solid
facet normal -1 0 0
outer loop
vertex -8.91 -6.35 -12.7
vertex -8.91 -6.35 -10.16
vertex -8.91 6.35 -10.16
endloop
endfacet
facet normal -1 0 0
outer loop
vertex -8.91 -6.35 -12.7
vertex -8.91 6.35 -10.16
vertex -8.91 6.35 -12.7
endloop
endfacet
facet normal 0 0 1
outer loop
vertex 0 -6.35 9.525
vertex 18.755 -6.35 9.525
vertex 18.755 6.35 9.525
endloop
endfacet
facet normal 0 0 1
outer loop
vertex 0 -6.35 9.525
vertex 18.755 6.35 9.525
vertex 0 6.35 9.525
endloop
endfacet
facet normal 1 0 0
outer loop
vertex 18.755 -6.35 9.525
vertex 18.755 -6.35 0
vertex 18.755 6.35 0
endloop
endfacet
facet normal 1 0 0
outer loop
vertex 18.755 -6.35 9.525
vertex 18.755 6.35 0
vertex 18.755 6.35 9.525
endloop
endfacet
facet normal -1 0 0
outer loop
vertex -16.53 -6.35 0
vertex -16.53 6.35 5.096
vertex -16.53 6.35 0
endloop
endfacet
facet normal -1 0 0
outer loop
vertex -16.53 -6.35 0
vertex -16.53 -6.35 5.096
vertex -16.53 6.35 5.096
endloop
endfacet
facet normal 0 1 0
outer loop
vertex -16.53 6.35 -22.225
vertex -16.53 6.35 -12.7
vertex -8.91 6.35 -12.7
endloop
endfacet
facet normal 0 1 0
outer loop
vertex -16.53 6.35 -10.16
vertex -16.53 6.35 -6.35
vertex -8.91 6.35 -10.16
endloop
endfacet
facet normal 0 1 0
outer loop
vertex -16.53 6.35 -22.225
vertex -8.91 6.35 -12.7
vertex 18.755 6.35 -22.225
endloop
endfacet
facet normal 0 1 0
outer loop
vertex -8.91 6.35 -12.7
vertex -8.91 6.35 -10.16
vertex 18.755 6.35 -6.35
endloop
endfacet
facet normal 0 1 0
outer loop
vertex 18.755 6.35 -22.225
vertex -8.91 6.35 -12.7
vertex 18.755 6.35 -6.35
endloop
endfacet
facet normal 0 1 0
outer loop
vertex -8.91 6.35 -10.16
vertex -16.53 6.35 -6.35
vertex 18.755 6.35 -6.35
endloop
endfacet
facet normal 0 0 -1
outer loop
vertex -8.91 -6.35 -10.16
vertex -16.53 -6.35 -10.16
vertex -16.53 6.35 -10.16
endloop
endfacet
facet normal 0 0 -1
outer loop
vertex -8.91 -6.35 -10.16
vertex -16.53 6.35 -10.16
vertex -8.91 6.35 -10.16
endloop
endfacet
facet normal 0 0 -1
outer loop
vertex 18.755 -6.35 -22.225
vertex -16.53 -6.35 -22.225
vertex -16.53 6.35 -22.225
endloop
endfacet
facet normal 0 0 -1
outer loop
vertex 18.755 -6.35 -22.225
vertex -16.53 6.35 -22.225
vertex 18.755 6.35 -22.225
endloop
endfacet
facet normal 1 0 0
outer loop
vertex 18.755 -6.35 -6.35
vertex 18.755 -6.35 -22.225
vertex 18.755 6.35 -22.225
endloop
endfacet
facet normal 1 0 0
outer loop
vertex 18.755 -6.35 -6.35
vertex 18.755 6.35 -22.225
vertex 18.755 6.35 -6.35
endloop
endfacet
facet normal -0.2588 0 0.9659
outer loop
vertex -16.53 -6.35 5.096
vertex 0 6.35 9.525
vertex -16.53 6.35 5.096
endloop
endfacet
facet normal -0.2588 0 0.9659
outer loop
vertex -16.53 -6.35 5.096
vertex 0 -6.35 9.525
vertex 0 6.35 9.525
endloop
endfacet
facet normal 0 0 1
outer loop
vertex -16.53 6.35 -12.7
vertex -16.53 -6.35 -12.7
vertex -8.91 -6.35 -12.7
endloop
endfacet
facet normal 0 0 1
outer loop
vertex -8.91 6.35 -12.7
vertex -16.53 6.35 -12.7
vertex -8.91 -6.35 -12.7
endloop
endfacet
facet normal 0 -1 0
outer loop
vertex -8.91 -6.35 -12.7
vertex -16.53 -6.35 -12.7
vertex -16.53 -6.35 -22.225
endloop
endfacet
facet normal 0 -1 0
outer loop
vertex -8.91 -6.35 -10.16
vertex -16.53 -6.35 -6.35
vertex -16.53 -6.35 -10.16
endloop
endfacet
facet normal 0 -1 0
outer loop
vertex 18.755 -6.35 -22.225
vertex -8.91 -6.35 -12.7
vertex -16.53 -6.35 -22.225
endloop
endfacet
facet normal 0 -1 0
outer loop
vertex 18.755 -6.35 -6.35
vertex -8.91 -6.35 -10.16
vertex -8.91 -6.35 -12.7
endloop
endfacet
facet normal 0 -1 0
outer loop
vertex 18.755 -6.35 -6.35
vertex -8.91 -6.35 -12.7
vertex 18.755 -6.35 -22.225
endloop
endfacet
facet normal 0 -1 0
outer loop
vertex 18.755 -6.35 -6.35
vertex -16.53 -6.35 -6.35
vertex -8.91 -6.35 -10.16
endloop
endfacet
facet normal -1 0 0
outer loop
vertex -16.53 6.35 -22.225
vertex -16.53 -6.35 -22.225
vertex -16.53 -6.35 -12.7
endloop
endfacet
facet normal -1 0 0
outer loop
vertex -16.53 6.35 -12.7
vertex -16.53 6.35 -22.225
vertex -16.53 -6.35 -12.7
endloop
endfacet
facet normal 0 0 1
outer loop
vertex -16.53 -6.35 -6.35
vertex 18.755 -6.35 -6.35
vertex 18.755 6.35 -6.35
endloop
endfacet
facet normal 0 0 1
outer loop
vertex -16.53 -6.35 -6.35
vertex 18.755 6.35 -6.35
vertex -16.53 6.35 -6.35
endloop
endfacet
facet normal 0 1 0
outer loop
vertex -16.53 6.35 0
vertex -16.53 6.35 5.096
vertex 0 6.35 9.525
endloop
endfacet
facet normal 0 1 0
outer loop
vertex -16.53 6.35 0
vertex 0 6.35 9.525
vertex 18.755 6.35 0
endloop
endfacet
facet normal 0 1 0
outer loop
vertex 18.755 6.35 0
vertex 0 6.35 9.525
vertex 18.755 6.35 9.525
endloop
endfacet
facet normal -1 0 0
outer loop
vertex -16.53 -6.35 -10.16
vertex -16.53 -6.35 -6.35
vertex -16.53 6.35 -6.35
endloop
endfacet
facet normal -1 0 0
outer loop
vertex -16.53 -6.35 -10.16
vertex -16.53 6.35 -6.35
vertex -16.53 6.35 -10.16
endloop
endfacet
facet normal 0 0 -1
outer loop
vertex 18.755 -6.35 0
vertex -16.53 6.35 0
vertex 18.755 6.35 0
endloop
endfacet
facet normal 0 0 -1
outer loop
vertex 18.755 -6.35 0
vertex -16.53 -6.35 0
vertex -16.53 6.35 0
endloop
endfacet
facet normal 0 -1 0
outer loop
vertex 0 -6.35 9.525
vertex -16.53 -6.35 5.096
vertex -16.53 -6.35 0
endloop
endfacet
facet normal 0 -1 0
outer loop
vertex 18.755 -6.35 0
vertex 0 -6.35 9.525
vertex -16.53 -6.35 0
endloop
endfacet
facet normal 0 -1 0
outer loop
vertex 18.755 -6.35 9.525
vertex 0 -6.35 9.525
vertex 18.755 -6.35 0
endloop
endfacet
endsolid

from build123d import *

# Parameters (mm, degrees)
F1_DEPTH = 6.35
F2_W     = 35.284452
F2_H     = 9.525
F3_DEPTH = 6.35
F5_DEPTH = 12.7


with BuildPart() as f1:
    # F0 (on Front) → F1 (new body, symmetric)
    with BuildSketch(Plane.XZ):
        Polygon((-16.52972, 0), (0, 0), (18.754732, 0), (18.754732, 9.525), (0, 9.525), (-16.52972, 5.095875), align=None)
    extrude(amount=F1_DEPTH, both=True)


with BuildPart() as f3:
    # F2 (on Front) → F3 (new body, symmetric)
    with BuildSketch(Plane.XZ):
        with Locations((1.112506, -17.4625)):
            Rectangle(F2_W, F2_H)
    extrude(amount=F3_DEPTH, both=True)

    # F4 (on face) → F5 (join, through all)
    with BuildSketch(Plane.XZ.offset(6.35)):
        Polygon((-8.90972, -12.7), (18.754732, -12.7), (18.754732, -10.16), (18.754732, -6.35), (-16.52972, -6.35), (-16.52972, -10.16), (-8.90972, -10.16), align=None)
    extrude(amount=-F5_DEPTH)


solid = Compound([f1.part, f3.part])
